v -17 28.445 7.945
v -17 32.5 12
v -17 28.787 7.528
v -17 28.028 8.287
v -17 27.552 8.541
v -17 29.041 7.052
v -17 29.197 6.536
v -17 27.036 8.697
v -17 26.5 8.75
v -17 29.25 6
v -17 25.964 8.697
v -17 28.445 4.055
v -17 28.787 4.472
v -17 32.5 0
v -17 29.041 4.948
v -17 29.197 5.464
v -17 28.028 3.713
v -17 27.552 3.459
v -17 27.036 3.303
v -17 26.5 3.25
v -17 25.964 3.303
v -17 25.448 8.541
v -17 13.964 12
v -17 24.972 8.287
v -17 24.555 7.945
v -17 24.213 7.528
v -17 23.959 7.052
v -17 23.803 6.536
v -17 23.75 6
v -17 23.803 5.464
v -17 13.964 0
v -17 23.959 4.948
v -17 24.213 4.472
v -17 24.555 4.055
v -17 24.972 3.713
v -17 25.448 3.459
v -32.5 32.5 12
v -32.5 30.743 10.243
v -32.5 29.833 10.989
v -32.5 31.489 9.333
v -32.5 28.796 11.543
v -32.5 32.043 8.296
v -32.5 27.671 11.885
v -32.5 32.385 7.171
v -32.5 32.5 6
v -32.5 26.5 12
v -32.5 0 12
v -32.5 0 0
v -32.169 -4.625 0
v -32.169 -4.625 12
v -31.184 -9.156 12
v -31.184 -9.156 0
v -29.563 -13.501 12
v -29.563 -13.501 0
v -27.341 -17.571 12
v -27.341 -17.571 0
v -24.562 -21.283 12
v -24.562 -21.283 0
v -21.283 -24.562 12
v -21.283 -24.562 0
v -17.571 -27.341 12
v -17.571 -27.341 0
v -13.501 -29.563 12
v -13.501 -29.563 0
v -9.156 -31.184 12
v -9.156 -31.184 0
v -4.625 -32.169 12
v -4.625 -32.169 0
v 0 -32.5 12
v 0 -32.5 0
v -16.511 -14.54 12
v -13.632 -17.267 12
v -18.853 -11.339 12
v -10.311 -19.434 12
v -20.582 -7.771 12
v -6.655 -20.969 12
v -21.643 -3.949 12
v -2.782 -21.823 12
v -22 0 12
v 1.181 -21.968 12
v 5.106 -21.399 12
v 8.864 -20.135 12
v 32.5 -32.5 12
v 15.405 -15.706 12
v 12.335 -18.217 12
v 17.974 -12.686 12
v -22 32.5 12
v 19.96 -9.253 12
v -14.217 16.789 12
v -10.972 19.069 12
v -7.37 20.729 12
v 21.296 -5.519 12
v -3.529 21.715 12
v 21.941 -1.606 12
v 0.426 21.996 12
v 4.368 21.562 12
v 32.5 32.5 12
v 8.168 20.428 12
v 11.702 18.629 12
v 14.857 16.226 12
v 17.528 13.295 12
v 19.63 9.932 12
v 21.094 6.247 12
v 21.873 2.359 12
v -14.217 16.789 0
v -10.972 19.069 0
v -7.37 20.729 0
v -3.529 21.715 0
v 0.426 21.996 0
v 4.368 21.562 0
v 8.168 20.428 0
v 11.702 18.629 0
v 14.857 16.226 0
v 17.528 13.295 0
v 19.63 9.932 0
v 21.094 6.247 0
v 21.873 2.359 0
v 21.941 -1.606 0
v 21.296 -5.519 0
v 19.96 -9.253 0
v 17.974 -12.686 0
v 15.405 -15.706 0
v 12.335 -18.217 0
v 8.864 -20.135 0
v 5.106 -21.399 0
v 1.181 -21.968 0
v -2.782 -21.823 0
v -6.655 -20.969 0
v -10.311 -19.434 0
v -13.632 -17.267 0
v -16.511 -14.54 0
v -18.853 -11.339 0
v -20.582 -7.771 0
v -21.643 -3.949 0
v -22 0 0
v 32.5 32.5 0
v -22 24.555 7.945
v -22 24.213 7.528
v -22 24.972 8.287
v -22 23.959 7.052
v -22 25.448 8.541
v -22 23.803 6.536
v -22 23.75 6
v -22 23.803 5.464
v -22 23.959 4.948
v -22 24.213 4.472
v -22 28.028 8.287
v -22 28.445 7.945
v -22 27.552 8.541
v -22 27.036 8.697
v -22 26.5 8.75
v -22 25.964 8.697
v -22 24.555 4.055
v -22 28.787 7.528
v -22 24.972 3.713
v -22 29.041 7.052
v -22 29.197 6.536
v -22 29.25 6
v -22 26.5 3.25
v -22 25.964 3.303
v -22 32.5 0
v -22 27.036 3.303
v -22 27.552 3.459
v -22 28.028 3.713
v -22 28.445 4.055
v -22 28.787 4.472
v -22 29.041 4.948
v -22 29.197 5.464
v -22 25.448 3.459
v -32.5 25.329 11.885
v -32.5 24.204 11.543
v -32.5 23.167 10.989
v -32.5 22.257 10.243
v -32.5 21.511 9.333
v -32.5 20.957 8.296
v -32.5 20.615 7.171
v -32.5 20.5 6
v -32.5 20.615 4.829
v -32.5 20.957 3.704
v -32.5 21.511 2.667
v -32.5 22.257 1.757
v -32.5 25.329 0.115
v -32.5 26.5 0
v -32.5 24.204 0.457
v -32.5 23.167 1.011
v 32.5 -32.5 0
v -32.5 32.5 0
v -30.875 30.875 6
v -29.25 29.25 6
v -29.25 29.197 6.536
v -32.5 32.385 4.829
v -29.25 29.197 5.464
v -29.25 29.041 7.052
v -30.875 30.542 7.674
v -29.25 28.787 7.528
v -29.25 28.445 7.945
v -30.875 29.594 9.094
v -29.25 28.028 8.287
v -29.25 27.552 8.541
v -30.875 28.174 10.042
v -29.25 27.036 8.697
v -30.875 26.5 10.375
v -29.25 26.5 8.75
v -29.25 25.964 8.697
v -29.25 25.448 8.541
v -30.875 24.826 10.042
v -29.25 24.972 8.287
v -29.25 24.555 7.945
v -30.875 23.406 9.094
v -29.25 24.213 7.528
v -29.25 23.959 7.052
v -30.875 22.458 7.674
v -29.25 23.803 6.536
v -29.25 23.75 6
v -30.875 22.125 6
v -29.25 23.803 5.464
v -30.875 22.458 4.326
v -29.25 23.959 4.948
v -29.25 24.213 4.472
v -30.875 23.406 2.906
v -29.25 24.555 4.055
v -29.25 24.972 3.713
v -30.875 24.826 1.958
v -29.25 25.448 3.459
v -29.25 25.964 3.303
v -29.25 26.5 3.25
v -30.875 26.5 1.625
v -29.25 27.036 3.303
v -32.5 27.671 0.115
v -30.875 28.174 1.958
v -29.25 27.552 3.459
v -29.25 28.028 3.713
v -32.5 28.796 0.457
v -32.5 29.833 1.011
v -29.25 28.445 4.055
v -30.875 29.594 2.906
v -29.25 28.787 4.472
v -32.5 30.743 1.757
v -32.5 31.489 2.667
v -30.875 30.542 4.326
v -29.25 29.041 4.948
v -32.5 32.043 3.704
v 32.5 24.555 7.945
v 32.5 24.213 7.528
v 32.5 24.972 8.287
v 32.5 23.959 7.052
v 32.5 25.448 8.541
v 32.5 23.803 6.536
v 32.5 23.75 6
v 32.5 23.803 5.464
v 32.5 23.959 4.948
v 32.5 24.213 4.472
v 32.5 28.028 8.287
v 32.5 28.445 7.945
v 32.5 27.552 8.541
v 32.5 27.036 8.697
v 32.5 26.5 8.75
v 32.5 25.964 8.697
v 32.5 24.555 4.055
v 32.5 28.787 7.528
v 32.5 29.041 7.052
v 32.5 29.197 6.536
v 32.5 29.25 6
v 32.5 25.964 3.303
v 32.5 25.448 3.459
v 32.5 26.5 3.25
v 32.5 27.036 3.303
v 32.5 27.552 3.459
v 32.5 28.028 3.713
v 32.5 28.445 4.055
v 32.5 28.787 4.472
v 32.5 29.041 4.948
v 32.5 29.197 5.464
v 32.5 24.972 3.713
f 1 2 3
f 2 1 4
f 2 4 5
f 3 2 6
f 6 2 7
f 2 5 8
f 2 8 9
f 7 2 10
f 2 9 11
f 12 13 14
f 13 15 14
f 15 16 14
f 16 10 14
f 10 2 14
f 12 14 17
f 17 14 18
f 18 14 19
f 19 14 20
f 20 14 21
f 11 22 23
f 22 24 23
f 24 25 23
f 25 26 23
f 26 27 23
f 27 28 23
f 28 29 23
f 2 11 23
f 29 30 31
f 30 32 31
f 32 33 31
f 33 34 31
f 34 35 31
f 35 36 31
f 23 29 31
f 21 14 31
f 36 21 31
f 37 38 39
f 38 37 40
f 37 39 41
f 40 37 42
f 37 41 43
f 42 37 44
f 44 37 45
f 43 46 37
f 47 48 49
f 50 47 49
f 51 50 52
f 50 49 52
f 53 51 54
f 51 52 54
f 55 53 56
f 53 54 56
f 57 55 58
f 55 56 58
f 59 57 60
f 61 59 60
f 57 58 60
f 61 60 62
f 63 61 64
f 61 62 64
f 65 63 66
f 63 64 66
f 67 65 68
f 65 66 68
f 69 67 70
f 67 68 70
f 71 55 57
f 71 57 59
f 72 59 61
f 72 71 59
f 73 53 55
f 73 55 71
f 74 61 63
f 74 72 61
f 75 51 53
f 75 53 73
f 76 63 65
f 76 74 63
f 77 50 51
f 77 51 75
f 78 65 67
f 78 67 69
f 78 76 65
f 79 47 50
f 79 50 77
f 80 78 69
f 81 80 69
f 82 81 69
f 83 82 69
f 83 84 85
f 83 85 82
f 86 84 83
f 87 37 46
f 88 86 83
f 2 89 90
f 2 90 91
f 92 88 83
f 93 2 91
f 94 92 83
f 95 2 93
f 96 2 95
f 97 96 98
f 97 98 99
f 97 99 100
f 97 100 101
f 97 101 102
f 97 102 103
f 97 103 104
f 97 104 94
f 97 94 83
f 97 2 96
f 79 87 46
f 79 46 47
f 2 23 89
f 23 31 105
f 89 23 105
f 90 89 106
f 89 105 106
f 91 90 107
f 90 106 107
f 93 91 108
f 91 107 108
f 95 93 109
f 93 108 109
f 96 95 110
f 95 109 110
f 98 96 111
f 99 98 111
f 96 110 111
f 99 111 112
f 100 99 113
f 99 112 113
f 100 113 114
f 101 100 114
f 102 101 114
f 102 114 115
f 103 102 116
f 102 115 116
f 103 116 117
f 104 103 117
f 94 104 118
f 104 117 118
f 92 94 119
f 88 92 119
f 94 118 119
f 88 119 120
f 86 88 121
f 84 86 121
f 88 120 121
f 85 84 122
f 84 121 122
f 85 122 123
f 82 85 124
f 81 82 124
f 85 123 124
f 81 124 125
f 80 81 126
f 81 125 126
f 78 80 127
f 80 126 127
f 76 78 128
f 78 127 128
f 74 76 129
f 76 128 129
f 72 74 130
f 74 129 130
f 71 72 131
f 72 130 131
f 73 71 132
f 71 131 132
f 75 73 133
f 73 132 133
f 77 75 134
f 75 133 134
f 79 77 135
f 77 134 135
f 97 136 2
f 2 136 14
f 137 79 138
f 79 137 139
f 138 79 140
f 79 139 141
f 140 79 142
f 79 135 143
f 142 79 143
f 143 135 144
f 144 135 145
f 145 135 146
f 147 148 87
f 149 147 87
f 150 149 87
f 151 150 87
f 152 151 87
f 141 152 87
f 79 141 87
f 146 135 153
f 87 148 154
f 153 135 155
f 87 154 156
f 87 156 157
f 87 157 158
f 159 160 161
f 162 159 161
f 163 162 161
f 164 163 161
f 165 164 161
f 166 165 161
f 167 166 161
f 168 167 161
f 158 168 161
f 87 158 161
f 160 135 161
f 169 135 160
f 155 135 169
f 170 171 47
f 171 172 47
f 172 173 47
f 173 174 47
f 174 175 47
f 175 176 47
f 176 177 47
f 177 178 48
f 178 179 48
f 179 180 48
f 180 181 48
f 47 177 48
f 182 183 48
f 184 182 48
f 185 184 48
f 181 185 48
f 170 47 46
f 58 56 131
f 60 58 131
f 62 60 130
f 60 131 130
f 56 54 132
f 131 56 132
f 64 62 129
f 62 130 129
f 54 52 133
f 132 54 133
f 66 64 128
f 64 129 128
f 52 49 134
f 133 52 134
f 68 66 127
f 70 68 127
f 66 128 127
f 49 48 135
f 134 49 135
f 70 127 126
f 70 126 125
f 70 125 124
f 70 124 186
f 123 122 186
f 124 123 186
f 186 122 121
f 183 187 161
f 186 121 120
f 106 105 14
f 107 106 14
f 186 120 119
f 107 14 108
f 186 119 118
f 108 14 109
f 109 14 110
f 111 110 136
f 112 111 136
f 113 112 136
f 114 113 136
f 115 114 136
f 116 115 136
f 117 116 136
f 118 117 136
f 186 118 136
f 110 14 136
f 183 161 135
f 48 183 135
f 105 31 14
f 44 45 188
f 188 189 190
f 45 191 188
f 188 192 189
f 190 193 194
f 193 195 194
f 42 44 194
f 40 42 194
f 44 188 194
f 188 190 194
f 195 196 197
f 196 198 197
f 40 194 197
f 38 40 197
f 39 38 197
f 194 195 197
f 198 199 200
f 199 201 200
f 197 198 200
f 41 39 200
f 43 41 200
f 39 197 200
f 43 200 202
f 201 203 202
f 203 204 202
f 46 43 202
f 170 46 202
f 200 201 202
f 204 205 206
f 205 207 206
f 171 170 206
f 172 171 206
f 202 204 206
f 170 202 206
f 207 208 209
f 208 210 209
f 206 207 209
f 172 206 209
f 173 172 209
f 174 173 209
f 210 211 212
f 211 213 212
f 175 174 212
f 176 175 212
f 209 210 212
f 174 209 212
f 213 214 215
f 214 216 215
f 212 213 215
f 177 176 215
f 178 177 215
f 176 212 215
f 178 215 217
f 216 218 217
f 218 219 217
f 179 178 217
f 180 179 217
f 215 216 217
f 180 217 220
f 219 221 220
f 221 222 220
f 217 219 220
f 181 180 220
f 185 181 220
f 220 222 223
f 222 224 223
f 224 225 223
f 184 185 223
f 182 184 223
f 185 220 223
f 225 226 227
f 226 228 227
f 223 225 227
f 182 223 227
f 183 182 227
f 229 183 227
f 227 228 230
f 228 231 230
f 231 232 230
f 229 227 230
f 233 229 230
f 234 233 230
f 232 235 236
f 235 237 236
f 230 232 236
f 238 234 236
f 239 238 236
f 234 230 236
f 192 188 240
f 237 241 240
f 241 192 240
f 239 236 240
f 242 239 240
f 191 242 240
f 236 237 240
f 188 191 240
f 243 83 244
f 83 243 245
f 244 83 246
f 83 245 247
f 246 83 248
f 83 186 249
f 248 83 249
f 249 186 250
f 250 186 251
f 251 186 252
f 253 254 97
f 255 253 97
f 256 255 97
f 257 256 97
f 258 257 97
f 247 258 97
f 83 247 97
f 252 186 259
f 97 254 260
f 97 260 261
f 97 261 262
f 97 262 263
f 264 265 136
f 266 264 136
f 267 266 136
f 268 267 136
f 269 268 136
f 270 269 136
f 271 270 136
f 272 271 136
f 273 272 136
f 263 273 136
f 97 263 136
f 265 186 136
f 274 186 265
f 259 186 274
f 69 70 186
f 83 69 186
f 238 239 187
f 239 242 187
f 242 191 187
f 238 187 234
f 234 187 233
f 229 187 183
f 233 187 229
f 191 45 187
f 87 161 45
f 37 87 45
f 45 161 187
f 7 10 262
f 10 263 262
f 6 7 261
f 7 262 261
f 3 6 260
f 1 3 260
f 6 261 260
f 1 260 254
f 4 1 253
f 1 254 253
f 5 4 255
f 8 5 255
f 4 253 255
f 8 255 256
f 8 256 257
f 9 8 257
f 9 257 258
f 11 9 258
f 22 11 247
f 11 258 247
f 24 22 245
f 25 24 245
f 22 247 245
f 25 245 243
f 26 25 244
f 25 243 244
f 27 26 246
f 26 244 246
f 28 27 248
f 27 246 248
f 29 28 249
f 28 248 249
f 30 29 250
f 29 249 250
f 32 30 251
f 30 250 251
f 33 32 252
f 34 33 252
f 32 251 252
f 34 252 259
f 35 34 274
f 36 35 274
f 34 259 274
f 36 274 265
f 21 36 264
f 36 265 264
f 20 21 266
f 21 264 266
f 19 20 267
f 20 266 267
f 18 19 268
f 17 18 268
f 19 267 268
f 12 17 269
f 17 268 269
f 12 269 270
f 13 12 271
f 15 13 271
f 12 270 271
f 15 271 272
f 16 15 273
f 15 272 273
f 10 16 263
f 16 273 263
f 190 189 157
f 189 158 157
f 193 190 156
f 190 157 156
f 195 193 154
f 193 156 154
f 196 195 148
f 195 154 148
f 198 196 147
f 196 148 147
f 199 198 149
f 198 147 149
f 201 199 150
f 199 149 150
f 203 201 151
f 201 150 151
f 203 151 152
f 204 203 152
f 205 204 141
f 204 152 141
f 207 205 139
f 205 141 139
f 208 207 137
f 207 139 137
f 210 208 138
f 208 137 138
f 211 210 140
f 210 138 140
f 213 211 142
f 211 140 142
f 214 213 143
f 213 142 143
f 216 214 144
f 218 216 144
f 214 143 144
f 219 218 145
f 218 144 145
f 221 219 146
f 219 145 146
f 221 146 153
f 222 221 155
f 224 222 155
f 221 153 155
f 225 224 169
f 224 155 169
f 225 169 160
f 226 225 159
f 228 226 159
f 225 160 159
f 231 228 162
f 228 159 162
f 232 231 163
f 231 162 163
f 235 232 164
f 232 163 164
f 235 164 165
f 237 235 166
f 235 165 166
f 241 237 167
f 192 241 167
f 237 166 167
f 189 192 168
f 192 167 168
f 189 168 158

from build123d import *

# Parameters (mm, degrees)
F1_DEPTH       = 12
F3_D           = 5.5
F3_CSINK_D     = 12
F3_CSINK_ANGLE = 90


with BuildPart() as f1:
    # F0 (on Top) → F1 (new body)
    with BuildSketch(Plane.XY):
        with BuildLine():
            ThreePointArc((-17, 13.96424), (20.712315, -7.416198), (-22, 0))
            Line((-22, 0), (-22, 32.5))
            Line((-22, 32.5), (-32.5, 32.5))
            Line((-32.5, 32.5), (-32.5, 0))
            ThreePointArc((-32.5, 0), (-22.98097, -22.98097), (0, -32.5))
            Line((0, -32.5), (32.5, -32.5))
            Line((32.5, -32.5), (32.5, 32.5))
            Line((32.5, 32.5), (0, 32.5))
            Line((0, 32.5), (-17, 32.5))
            Line((-17, 32.5), (-17, 13.96424))
        make_face()
    extrude(amount=F1_DEPTH)

    # F3 (through all)
    with Locations(Plane(origin=(-32.5, 0, 0), x_dir=(0, -1, 0), z_dir=(-1, 0, 0))):
        with Locations((-26.5, 6)):
            CounterSinkHole(F3_D / 2, F3_CSINK_D / 2, counter_sink_angle=F3_CSINK_ANGLE)


solid = f1.part
